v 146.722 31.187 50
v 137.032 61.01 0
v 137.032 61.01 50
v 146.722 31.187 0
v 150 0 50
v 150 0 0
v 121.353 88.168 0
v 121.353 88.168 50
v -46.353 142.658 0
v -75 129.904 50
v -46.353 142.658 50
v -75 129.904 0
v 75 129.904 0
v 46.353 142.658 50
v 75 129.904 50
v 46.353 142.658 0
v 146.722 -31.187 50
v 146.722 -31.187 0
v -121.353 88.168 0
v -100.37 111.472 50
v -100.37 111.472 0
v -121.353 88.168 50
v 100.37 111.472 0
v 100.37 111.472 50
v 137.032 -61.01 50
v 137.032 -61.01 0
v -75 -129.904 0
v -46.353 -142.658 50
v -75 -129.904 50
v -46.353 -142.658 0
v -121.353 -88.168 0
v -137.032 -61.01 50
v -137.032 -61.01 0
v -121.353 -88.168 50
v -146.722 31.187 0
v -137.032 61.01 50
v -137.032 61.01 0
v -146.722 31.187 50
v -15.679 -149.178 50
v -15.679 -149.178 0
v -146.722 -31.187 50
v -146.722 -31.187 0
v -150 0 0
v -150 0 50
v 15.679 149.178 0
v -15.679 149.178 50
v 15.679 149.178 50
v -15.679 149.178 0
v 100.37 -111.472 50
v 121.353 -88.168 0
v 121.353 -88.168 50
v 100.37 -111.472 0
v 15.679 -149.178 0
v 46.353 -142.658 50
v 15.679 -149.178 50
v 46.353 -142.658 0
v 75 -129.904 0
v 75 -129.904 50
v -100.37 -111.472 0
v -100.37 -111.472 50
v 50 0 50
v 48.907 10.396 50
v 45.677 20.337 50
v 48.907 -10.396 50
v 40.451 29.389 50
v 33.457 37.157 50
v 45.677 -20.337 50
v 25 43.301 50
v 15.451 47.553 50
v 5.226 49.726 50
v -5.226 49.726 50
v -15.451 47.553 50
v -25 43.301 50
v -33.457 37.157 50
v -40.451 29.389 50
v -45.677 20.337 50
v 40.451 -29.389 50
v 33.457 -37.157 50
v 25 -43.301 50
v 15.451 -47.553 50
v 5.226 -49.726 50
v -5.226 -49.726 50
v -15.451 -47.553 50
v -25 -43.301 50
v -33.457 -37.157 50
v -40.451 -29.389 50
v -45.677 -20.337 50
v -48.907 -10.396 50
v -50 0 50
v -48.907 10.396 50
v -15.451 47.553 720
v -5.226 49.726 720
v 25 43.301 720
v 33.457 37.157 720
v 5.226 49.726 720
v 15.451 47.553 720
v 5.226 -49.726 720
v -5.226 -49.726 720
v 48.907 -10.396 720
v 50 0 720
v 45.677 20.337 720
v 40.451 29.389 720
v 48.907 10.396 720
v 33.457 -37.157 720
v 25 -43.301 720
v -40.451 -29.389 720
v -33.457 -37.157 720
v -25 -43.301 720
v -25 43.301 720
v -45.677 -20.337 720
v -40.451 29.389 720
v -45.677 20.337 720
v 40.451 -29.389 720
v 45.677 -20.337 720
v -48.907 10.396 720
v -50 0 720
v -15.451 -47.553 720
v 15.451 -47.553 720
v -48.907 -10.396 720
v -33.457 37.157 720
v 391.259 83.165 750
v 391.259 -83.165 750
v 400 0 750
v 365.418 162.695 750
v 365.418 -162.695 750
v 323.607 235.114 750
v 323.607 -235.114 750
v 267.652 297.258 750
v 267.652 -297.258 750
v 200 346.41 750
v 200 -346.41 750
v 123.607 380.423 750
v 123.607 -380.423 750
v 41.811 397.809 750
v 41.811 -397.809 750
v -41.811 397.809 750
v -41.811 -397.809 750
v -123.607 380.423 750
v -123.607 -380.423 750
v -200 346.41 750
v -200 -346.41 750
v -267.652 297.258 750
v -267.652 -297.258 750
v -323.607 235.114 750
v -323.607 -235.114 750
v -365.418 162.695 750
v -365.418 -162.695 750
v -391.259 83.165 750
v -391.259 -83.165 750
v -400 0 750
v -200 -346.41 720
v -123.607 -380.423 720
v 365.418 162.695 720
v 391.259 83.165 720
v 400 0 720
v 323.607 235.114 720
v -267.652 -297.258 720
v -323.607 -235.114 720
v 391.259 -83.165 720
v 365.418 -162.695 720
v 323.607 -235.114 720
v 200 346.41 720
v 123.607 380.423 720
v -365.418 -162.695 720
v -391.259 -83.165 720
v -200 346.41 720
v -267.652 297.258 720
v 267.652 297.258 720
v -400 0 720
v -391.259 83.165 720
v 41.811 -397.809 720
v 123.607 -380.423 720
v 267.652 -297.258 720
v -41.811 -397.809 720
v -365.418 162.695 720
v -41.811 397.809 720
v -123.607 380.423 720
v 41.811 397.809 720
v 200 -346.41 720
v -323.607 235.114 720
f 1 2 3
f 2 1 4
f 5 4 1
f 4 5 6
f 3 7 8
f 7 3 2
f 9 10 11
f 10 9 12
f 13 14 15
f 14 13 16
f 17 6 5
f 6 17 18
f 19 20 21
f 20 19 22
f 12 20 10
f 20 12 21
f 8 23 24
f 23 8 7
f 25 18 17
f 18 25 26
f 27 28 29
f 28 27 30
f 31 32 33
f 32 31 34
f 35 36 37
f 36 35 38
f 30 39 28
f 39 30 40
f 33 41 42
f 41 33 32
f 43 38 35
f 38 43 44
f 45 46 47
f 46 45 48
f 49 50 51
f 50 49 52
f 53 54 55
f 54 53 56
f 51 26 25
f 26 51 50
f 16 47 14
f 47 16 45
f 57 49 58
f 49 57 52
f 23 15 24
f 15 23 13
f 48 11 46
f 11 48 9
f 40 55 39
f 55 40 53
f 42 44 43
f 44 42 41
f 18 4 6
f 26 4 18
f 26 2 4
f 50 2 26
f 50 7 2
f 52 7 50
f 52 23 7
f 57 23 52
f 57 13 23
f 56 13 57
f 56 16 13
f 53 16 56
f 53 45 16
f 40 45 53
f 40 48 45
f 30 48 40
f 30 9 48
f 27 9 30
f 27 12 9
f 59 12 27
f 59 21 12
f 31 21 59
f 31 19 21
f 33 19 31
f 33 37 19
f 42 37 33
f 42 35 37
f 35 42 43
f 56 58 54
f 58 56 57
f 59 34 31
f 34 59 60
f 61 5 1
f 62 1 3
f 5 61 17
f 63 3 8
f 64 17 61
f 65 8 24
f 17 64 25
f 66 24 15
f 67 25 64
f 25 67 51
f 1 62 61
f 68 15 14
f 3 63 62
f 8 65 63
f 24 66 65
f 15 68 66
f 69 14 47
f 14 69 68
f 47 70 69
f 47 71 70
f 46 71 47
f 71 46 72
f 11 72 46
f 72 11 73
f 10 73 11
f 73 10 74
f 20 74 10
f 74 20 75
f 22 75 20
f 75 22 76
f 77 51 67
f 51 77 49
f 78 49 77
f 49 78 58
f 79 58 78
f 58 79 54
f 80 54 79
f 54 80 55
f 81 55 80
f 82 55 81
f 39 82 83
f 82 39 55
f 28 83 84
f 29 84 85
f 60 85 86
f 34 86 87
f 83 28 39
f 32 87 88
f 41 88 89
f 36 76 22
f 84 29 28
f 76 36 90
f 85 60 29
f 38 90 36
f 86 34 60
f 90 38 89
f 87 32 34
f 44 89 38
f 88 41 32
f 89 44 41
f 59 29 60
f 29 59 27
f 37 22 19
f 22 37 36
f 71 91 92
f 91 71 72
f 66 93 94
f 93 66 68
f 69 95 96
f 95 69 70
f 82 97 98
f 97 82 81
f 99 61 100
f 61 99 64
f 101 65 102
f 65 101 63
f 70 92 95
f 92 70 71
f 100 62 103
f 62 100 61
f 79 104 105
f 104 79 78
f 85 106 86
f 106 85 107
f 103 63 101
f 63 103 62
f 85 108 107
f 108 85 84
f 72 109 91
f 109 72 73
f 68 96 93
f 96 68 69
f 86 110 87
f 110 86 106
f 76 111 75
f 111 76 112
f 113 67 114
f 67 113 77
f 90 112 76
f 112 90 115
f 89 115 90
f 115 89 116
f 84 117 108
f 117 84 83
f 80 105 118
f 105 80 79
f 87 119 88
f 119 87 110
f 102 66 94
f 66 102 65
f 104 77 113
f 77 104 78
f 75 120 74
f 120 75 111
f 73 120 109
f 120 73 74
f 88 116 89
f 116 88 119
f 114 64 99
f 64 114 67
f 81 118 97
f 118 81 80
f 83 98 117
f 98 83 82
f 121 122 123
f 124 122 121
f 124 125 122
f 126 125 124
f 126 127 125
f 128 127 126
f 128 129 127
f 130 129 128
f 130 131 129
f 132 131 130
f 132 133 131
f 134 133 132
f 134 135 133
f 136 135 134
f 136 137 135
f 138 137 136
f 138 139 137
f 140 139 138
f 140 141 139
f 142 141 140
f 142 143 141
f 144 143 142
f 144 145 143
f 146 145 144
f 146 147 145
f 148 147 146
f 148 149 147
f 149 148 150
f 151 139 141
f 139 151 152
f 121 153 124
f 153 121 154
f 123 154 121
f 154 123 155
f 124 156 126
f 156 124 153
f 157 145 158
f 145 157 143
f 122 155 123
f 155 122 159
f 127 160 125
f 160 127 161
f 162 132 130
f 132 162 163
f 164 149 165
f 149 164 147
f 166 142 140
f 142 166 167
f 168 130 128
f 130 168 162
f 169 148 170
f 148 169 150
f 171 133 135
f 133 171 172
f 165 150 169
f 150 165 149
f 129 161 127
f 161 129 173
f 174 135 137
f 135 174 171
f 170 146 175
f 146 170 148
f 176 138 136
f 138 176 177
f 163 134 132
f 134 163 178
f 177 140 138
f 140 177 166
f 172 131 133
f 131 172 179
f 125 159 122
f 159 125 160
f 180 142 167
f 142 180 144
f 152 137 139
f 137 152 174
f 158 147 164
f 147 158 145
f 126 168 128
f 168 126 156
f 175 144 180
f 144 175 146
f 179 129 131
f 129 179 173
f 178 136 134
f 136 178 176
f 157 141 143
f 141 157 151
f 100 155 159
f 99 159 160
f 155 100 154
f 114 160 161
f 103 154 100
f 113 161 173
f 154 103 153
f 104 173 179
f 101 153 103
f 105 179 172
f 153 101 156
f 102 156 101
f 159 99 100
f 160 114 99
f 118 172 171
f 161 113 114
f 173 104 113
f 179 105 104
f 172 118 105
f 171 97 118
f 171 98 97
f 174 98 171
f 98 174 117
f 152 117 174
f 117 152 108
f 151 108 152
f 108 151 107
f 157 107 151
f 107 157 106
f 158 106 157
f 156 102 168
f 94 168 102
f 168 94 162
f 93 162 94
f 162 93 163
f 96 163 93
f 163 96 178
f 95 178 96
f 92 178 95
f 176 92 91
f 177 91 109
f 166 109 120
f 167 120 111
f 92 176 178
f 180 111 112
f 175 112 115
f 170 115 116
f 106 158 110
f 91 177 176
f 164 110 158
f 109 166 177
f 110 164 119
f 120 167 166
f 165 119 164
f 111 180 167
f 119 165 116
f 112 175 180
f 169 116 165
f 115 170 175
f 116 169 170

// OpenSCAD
// Author: Mihai Oltean, www.tcreate.org, mihai.oltean@gmail.com
// More details: jenny5.org
// Source: github.com/jenny5-robot
// MIT License
//--------------------------------------------------------------

module masa_rotunda(inaltime, raza)
{
    grosime_placa = 30;
// baza
	cylinder (h = 50, r = 150);
	// picior
	cylinder (h = inaltime, r = 50);
	// masa
	translate ([0, 0, inaltime - grosime_placa]) cylinder (h = grosime_placa, r = raza);
}

masa_rotunda(750, 400);
